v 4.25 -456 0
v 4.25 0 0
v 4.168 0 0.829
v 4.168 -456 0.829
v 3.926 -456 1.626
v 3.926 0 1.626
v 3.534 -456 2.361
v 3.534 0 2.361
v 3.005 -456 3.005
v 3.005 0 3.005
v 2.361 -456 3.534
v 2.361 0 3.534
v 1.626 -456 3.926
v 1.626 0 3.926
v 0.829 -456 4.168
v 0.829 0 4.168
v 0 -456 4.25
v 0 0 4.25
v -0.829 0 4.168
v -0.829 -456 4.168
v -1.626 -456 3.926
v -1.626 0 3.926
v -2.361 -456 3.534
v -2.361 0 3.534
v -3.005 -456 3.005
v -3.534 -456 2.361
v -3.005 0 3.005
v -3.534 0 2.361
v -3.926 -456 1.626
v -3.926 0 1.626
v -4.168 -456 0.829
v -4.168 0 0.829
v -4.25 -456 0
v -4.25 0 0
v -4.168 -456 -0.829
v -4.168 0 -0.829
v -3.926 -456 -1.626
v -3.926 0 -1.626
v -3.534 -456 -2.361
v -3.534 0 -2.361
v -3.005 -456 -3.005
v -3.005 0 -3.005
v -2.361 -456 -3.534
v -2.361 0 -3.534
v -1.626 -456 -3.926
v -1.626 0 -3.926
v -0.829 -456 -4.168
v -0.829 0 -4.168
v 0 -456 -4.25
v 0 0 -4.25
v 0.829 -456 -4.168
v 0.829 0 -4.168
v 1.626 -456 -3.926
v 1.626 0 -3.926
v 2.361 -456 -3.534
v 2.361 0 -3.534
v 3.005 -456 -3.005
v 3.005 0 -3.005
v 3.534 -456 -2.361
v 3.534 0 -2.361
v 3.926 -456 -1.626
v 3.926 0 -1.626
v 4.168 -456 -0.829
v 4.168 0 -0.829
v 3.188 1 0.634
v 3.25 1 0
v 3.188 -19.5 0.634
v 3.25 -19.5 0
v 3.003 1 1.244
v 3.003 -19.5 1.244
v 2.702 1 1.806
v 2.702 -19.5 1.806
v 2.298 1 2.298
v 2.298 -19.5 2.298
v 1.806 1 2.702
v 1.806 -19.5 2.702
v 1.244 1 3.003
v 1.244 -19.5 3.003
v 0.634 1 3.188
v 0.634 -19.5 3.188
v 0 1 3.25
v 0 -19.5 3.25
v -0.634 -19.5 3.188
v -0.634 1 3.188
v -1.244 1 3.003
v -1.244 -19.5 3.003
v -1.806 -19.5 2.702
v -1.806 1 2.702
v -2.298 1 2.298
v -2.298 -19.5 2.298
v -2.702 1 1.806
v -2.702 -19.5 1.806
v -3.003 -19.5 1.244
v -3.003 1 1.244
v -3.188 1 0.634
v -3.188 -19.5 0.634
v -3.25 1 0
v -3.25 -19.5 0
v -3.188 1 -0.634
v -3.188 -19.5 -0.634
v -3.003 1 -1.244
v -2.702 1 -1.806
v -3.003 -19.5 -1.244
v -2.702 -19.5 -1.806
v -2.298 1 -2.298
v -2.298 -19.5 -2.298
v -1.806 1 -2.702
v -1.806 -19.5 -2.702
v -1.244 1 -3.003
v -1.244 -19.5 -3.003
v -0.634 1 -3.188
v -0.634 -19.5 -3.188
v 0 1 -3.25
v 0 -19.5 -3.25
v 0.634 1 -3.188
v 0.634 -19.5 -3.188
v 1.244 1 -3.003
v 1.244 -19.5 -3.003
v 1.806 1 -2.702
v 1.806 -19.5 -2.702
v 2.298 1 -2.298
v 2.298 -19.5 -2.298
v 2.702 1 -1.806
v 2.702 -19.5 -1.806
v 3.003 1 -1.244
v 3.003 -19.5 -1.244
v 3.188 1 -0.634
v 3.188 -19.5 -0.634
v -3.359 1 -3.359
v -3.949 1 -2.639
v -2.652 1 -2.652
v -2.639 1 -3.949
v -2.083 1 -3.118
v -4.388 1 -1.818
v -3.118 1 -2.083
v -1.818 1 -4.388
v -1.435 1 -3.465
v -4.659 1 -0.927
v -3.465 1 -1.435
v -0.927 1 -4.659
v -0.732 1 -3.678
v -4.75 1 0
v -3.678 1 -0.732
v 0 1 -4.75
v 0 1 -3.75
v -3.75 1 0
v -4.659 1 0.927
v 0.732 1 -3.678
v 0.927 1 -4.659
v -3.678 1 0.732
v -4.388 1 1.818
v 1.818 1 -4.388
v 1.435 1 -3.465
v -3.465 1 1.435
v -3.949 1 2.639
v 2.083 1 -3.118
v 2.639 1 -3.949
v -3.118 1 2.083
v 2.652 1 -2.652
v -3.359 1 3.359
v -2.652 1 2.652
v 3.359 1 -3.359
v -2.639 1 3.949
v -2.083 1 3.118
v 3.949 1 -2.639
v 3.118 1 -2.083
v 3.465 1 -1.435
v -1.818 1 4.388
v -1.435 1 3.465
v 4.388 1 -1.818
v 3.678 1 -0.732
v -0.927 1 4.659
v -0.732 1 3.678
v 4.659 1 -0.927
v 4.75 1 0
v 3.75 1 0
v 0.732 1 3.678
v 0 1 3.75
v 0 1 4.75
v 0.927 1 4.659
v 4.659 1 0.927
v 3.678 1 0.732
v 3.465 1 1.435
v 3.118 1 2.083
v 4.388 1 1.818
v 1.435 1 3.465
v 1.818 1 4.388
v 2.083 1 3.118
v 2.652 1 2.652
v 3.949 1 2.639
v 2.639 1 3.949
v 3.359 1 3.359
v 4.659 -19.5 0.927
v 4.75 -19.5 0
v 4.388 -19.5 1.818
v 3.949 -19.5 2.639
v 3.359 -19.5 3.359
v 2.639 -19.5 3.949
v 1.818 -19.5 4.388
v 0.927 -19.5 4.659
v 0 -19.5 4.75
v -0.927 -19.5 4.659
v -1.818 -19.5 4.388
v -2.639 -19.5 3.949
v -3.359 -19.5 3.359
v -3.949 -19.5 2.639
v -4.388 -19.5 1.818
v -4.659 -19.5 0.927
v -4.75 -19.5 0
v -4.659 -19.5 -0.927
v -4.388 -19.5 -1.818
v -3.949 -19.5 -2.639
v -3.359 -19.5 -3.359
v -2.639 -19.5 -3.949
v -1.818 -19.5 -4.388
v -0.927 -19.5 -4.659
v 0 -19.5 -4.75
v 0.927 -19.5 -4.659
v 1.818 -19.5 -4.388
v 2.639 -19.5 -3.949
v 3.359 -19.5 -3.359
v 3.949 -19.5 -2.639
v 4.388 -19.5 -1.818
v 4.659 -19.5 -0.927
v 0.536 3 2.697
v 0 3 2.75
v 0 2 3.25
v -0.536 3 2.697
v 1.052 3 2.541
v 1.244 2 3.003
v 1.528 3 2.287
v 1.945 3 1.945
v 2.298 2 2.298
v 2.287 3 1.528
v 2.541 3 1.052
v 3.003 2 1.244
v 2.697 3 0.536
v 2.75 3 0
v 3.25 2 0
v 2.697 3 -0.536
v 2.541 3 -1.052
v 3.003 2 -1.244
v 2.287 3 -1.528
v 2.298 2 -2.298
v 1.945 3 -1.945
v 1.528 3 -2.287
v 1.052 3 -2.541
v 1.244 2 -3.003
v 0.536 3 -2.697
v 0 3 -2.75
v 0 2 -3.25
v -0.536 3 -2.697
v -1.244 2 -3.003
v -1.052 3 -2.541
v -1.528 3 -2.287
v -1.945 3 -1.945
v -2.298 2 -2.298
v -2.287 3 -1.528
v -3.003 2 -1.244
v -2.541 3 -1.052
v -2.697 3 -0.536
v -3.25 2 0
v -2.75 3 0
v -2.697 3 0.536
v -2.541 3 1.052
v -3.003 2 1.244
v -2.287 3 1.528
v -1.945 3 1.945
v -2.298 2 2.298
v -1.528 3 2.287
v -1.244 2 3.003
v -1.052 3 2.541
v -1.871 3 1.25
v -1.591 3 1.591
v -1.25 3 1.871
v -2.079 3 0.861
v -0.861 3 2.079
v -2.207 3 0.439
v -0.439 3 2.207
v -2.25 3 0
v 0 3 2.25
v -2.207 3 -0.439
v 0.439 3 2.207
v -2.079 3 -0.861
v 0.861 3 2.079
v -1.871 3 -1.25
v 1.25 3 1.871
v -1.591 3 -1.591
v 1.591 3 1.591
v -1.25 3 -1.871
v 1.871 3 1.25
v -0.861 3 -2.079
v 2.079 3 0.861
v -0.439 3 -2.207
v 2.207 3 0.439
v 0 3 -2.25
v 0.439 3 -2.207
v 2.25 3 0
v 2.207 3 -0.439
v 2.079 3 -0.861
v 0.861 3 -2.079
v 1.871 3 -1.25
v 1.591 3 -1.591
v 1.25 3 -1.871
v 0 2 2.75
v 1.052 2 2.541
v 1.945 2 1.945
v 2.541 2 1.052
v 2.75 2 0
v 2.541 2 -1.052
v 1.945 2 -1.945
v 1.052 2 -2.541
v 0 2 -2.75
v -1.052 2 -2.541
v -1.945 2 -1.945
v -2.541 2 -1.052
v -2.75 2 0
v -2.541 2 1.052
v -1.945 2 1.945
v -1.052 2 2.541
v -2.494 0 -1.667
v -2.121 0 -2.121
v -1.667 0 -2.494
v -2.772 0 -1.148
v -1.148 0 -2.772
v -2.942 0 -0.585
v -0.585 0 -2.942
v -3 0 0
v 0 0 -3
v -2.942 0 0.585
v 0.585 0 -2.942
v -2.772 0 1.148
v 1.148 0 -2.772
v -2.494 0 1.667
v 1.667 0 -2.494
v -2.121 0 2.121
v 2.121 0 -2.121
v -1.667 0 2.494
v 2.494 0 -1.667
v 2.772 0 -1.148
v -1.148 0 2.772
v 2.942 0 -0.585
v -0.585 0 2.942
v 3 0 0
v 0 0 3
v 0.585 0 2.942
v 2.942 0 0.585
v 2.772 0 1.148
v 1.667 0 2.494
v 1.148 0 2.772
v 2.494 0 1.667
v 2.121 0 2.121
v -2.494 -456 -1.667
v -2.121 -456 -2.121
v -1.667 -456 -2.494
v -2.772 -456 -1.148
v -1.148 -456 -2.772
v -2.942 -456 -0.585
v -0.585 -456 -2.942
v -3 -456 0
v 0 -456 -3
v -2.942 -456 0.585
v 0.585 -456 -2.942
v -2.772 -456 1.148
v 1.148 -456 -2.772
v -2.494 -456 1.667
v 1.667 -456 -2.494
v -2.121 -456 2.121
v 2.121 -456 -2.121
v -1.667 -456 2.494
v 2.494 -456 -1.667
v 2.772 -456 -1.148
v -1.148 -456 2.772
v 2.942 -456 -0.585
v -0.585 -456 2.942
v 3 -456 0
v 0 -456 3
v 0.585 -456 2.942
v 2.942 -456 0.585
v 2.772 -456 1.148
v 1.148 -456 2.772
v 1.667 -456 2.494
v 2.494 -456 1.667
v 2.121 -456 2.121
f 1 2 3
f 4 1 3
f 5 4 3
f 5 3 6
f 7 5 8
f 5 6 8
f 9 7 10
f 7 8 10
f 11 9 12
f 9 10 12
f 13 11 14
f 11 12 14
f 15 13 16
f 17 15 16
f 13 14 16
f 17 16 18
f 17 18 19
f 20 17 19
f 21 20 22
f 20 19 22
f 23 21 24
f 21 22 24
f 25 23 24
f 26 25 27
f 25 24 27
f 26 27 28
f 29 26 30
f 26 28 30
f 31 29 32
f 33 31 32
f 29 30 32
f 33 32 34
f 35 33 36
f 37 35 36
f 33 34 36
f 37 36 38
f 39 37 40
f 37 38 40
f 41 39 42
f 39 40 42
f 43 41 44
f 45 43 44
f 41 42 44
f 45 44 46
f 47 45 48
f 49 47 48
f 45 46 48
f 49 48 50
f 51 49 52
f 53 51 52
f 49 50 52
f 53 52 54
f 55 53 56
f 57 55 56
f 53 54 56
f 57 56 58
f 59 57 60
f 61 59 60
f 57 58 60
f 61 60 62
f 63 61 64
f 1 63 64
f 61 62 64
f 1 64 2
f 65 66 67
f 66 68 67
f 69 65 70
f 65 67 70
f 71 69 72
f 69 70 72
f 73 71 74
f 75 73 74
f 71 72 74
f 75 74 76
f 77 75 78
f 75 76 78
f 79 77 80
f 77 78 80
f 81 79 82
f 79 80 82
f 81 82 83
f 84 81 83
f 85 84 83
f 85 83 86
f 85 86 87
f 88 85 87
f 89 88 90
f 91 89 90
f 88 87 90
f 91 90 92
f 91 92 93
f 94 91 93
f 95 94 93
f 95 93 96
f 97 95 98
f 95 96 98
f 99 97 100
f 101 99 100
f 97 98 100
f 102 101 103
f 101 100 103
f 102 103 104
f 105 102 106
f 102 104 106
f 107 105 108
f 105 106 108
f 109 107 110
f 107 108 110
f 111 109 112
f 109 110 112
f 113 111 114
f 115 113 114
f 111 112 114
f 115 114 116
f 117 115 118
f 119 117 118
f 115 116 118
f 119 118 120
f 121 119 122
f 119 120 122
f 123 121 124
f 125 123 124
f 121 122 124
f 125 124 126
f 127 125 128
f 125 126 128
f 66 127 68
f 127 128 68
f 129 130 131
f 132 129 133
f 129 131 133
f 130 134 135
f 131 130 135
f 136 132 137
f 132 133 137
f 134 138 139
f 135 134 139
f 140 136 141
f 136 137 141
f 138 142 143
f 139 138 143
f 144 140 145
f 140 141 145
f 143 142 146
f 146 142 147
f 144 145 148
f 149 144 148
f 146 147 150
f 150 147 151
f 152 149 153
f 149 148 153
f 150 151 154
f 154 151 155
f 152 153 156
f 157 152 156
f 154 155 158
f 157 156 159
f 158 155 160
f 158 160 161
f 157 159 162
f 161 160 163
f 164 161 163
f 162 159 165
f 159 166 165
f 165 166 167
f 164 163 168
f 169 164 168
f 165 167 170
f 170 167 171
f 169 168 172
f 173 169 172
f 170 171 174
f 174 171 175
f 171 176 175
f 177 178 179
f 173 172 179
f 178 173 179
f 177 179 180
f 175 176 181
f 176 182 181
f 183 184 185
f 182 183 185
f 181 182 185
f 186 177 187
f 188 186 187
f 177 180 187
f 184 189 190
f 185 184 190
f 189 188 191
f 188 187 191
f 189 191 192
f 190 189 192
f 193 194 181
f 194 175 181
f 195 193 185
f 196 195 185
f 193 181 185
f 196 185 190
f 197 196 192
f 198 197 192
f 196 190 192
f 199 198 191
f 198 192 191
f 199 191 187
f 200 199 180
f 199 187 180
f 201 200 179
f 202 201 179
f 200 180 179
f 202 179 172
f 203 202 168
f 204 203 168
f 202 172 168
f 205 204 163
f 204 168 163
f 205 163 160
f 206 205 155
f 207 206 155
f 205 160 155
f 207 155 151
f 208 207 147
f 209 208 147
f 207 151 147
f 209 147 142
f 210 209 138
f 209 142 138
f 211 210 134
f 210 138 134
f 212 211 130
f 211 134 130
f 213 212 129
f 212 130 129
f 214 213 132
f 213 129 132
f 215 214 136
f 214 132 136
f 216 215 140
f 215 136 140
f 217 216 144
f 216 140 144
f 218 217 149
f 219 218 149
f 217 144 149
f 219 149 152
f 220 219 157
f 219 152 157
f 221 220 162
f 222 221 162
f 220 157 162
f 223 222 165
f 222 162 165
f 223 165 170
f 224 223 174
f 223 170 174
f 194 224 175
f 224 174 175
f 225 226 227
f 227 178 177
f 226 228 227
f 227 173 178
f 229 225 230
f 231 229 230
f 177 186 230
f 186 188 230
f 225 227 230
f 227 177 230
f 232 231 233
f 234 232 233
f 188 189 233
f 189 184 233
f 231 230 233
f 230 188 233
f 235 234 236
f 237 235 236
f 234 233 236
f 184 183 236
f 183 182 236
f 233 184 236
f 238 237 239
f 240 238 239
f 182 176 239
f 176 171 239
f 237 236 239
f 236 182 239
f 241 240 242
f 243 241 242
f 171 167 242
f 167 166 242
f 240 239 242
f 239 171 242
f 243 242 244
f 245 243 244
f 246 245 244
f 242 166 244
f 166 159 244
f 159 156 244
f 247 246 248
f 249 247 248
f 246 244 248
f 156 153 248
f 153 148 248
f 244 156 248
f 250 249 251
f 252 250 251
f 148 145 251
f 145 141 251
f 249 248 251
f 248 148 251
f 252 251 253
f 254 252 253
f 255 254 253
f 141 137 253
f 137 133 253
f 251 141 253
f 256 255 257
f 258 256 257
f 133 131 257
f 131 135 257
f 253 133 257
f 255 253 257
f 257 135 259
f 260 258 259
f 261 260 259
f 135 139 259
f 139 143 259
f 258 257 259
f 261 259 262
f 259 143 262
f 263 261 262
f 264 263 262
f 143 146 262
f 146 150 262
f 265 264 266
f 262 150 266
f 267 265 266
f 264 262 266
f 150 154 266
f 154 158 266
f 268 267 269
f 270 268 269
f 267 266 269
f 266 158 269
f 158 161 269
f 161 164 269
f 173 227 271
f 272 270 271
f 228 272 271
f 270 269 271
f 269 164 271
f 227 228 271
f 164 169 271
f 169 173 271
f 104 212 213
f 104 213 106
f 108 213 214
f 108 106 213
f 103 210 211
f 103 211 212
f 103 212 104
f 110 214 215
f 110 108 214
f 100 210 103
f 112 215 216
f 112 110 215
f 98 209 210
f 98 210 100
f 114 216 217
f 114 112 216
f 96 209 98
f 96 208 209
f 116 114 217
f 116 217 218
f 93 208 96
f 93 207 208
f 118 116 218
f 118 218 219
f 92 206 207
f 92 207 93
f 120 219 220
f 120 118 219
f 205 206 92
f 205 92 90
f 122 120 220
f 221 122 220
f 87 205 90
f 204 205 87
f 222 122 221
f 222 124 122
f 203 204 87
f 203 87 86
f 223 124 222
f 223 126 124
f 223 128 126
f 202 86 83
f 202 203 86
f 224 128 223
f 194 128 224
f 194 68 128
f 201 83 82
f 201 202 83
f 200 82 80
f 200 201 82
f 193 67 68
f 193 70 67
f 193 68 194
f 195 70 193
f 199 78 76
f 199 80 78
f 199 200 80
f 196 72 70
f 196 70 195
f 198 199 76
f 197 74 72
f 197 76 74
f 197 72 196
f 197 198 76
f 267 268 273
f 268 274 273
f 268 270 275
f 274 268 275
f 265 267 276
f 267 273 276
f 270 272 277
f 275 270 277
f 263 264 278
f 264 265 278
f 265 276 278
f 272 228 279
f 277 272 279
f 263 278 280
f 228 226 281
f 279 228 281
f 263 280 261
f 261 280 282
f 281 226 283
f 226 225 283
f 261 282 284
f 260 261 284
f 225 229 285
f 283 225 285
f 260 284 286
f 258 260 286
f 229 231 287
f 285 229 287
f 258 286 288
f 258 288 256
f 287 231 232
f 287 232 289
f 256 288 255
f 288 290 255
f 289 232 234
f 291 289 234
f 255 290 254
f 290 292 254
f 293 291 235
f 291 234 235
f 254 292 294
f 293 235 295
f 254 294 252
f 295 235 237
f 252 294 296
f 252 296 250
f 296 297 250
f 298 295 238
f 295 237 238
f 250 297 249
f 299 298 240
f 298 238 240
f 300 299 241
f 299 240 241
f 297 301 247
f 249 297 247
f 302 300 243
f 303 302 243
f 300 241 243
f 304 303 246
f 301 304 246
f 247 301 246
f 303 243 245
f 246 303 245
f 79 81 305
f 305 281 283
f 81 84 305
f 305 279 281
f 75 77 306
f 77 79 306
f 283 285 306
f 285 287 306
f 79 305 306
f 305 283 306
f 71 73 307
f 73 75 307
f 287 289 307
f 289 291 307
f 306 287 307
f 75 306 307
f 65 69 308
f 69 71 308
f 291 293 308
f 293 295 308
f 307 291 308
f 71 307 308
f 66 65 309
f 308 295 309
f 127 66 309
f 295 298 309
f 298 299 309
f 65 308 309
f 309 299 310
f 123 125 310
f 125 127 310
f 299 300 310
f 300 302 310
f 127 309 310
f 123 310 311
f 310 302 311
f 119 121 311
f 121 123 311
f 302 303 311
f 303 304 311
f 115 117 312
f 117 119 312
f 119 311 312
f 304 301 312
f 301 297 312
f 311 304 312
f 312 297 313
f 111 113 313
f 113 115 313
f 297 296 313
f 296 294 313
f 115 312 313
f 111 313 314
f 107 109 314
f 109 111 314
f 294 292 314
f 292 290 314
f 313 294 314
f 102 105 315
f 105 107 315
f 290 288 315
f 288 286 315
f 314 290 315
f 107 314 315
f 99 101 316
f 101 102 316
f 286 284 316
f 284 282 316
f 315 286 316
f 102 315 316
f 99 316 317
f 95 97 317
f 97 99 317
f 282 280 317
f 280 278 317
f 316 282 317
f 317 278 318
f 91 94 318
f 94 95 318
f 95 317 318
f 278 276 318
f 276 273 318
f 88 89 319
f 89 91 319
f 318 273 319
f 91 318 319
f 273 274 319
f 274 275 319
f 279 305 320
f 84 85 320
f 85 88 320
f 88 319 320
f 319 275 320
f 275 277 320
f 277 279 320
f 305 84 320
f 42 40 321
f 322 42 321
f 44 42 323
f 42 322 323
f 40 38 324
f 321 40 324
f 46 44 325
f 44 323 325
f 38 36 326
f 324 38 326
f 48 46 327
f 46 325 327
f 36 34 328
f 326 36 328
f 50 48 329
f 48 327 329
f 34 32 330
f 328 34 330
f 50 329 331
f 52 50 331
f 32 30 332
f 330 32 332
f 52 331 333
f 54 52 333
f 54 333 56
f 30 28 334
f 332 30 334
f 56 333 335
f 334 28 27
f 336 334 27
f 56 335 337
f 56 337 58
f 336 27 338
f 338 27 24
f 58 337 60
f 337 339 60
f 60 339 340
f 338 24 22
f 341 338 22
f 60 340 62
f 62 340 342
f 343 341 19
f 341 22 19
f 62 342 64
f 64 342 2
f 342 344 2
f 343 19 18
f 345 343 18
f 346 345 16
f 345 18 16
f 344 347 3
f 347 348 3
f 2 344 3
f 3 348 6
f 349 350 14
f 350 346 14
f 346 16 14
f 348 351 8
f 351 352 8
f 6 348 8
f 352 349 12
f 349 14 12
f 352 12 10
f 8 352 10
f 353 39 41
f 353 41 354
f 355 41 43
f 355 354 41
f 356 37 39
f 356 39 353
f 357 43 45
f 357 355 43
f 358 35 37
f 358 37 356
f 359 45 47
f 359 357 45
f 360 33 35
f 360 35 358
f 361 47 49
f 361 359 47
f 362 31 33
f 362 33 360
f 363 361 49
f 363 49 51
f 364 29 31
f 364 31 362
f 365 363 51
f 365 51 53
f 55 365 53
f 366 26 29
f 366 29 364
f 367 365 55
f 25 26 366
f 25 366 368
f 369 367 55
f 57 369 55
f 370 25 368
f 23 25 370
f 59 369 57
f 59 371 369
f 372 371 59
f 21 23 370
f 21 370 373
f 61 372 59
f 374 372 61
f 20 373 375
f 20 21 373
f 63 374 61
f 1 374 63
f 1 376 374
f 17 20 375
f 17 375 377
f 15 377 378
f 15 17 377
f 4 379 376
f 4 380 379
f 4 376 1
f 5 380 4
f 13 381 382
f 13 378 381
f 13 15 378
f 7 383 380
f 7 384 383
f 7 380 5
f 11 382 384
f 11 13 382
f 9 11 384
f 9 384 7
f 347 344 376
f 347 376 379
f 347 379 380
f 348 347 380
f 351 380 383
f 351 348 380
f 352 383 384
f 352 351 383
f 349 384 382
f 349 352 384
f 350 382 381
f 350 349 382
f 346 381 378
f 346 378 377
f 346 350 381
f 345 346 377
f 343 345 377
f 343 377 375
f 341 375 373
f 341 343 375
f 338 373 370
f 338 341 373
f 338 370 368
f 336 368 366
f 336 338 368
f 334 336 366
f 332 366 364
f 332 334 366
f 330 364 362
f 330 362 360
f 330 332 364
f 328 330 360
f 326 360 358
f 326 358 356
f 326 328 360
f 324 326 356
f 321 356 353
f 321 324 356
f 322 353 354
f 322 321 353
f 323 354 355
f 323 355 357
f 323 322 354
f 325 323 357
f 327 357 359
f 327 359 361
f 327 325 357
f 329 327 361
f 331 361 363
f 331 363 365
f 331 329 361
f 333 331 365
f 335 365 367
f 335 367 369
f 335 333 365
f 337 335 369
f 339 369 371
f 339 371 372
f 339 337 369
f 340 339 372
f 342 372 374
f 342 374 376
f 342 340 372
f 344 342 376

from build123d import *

# Parameters (mm, degrees)
F0_R     = 4.25
F0_R_2   = 3
F1_DEPTH = 456
F2_R     = 4.75
F2_R_2   = 4.25
F2_R_3   = 3.25
F3_DEPTH = 1
F4_DEPTH = 20.5


with BuildPart() as f1:
    # F0 (on Front) → F1 (new body)
    with BuildSketch(Plane.XZ):
        Circle(F0_R)
        Circle(F0_R_2, mode=Mode.SUBTRACT)
    extrude(amount=F1_DEPTH)


with BuildPart() as f3:
    # F2 (on Front) → F3 (new body)
    with BuildSketch(Plane.XZ):
        Circle(F2_R)
        Circle(F2_R_2, mode=Mode.SUBTRACT)
        Circle(F2_R_2)
        Circle(F2_R_3, mode=Mode.SUBTRACT)
    extrude(amount=-F3_DEPTH)

    # F4 (add): a face of the model
    f4_faces = [f3.faces().sort_by_distance(p)[0] for p in [
        (-4.6156497116, 1, 0),
    ]]
    extrude(f4_faces, amount=-F4_DEPTH)

    # F5 (on Right) → F6 (revolve)
    with BuildSketch(Plane.YZ):
        Polygon((1, 3.25), (3, 2.25), (3, 2.75), (1, 3.75), align=None)
    revolve(axis=Axis((0, 3.2308421517, 0), (0, 1, 0)))


solid = Compound([f1.part, f3.part])
